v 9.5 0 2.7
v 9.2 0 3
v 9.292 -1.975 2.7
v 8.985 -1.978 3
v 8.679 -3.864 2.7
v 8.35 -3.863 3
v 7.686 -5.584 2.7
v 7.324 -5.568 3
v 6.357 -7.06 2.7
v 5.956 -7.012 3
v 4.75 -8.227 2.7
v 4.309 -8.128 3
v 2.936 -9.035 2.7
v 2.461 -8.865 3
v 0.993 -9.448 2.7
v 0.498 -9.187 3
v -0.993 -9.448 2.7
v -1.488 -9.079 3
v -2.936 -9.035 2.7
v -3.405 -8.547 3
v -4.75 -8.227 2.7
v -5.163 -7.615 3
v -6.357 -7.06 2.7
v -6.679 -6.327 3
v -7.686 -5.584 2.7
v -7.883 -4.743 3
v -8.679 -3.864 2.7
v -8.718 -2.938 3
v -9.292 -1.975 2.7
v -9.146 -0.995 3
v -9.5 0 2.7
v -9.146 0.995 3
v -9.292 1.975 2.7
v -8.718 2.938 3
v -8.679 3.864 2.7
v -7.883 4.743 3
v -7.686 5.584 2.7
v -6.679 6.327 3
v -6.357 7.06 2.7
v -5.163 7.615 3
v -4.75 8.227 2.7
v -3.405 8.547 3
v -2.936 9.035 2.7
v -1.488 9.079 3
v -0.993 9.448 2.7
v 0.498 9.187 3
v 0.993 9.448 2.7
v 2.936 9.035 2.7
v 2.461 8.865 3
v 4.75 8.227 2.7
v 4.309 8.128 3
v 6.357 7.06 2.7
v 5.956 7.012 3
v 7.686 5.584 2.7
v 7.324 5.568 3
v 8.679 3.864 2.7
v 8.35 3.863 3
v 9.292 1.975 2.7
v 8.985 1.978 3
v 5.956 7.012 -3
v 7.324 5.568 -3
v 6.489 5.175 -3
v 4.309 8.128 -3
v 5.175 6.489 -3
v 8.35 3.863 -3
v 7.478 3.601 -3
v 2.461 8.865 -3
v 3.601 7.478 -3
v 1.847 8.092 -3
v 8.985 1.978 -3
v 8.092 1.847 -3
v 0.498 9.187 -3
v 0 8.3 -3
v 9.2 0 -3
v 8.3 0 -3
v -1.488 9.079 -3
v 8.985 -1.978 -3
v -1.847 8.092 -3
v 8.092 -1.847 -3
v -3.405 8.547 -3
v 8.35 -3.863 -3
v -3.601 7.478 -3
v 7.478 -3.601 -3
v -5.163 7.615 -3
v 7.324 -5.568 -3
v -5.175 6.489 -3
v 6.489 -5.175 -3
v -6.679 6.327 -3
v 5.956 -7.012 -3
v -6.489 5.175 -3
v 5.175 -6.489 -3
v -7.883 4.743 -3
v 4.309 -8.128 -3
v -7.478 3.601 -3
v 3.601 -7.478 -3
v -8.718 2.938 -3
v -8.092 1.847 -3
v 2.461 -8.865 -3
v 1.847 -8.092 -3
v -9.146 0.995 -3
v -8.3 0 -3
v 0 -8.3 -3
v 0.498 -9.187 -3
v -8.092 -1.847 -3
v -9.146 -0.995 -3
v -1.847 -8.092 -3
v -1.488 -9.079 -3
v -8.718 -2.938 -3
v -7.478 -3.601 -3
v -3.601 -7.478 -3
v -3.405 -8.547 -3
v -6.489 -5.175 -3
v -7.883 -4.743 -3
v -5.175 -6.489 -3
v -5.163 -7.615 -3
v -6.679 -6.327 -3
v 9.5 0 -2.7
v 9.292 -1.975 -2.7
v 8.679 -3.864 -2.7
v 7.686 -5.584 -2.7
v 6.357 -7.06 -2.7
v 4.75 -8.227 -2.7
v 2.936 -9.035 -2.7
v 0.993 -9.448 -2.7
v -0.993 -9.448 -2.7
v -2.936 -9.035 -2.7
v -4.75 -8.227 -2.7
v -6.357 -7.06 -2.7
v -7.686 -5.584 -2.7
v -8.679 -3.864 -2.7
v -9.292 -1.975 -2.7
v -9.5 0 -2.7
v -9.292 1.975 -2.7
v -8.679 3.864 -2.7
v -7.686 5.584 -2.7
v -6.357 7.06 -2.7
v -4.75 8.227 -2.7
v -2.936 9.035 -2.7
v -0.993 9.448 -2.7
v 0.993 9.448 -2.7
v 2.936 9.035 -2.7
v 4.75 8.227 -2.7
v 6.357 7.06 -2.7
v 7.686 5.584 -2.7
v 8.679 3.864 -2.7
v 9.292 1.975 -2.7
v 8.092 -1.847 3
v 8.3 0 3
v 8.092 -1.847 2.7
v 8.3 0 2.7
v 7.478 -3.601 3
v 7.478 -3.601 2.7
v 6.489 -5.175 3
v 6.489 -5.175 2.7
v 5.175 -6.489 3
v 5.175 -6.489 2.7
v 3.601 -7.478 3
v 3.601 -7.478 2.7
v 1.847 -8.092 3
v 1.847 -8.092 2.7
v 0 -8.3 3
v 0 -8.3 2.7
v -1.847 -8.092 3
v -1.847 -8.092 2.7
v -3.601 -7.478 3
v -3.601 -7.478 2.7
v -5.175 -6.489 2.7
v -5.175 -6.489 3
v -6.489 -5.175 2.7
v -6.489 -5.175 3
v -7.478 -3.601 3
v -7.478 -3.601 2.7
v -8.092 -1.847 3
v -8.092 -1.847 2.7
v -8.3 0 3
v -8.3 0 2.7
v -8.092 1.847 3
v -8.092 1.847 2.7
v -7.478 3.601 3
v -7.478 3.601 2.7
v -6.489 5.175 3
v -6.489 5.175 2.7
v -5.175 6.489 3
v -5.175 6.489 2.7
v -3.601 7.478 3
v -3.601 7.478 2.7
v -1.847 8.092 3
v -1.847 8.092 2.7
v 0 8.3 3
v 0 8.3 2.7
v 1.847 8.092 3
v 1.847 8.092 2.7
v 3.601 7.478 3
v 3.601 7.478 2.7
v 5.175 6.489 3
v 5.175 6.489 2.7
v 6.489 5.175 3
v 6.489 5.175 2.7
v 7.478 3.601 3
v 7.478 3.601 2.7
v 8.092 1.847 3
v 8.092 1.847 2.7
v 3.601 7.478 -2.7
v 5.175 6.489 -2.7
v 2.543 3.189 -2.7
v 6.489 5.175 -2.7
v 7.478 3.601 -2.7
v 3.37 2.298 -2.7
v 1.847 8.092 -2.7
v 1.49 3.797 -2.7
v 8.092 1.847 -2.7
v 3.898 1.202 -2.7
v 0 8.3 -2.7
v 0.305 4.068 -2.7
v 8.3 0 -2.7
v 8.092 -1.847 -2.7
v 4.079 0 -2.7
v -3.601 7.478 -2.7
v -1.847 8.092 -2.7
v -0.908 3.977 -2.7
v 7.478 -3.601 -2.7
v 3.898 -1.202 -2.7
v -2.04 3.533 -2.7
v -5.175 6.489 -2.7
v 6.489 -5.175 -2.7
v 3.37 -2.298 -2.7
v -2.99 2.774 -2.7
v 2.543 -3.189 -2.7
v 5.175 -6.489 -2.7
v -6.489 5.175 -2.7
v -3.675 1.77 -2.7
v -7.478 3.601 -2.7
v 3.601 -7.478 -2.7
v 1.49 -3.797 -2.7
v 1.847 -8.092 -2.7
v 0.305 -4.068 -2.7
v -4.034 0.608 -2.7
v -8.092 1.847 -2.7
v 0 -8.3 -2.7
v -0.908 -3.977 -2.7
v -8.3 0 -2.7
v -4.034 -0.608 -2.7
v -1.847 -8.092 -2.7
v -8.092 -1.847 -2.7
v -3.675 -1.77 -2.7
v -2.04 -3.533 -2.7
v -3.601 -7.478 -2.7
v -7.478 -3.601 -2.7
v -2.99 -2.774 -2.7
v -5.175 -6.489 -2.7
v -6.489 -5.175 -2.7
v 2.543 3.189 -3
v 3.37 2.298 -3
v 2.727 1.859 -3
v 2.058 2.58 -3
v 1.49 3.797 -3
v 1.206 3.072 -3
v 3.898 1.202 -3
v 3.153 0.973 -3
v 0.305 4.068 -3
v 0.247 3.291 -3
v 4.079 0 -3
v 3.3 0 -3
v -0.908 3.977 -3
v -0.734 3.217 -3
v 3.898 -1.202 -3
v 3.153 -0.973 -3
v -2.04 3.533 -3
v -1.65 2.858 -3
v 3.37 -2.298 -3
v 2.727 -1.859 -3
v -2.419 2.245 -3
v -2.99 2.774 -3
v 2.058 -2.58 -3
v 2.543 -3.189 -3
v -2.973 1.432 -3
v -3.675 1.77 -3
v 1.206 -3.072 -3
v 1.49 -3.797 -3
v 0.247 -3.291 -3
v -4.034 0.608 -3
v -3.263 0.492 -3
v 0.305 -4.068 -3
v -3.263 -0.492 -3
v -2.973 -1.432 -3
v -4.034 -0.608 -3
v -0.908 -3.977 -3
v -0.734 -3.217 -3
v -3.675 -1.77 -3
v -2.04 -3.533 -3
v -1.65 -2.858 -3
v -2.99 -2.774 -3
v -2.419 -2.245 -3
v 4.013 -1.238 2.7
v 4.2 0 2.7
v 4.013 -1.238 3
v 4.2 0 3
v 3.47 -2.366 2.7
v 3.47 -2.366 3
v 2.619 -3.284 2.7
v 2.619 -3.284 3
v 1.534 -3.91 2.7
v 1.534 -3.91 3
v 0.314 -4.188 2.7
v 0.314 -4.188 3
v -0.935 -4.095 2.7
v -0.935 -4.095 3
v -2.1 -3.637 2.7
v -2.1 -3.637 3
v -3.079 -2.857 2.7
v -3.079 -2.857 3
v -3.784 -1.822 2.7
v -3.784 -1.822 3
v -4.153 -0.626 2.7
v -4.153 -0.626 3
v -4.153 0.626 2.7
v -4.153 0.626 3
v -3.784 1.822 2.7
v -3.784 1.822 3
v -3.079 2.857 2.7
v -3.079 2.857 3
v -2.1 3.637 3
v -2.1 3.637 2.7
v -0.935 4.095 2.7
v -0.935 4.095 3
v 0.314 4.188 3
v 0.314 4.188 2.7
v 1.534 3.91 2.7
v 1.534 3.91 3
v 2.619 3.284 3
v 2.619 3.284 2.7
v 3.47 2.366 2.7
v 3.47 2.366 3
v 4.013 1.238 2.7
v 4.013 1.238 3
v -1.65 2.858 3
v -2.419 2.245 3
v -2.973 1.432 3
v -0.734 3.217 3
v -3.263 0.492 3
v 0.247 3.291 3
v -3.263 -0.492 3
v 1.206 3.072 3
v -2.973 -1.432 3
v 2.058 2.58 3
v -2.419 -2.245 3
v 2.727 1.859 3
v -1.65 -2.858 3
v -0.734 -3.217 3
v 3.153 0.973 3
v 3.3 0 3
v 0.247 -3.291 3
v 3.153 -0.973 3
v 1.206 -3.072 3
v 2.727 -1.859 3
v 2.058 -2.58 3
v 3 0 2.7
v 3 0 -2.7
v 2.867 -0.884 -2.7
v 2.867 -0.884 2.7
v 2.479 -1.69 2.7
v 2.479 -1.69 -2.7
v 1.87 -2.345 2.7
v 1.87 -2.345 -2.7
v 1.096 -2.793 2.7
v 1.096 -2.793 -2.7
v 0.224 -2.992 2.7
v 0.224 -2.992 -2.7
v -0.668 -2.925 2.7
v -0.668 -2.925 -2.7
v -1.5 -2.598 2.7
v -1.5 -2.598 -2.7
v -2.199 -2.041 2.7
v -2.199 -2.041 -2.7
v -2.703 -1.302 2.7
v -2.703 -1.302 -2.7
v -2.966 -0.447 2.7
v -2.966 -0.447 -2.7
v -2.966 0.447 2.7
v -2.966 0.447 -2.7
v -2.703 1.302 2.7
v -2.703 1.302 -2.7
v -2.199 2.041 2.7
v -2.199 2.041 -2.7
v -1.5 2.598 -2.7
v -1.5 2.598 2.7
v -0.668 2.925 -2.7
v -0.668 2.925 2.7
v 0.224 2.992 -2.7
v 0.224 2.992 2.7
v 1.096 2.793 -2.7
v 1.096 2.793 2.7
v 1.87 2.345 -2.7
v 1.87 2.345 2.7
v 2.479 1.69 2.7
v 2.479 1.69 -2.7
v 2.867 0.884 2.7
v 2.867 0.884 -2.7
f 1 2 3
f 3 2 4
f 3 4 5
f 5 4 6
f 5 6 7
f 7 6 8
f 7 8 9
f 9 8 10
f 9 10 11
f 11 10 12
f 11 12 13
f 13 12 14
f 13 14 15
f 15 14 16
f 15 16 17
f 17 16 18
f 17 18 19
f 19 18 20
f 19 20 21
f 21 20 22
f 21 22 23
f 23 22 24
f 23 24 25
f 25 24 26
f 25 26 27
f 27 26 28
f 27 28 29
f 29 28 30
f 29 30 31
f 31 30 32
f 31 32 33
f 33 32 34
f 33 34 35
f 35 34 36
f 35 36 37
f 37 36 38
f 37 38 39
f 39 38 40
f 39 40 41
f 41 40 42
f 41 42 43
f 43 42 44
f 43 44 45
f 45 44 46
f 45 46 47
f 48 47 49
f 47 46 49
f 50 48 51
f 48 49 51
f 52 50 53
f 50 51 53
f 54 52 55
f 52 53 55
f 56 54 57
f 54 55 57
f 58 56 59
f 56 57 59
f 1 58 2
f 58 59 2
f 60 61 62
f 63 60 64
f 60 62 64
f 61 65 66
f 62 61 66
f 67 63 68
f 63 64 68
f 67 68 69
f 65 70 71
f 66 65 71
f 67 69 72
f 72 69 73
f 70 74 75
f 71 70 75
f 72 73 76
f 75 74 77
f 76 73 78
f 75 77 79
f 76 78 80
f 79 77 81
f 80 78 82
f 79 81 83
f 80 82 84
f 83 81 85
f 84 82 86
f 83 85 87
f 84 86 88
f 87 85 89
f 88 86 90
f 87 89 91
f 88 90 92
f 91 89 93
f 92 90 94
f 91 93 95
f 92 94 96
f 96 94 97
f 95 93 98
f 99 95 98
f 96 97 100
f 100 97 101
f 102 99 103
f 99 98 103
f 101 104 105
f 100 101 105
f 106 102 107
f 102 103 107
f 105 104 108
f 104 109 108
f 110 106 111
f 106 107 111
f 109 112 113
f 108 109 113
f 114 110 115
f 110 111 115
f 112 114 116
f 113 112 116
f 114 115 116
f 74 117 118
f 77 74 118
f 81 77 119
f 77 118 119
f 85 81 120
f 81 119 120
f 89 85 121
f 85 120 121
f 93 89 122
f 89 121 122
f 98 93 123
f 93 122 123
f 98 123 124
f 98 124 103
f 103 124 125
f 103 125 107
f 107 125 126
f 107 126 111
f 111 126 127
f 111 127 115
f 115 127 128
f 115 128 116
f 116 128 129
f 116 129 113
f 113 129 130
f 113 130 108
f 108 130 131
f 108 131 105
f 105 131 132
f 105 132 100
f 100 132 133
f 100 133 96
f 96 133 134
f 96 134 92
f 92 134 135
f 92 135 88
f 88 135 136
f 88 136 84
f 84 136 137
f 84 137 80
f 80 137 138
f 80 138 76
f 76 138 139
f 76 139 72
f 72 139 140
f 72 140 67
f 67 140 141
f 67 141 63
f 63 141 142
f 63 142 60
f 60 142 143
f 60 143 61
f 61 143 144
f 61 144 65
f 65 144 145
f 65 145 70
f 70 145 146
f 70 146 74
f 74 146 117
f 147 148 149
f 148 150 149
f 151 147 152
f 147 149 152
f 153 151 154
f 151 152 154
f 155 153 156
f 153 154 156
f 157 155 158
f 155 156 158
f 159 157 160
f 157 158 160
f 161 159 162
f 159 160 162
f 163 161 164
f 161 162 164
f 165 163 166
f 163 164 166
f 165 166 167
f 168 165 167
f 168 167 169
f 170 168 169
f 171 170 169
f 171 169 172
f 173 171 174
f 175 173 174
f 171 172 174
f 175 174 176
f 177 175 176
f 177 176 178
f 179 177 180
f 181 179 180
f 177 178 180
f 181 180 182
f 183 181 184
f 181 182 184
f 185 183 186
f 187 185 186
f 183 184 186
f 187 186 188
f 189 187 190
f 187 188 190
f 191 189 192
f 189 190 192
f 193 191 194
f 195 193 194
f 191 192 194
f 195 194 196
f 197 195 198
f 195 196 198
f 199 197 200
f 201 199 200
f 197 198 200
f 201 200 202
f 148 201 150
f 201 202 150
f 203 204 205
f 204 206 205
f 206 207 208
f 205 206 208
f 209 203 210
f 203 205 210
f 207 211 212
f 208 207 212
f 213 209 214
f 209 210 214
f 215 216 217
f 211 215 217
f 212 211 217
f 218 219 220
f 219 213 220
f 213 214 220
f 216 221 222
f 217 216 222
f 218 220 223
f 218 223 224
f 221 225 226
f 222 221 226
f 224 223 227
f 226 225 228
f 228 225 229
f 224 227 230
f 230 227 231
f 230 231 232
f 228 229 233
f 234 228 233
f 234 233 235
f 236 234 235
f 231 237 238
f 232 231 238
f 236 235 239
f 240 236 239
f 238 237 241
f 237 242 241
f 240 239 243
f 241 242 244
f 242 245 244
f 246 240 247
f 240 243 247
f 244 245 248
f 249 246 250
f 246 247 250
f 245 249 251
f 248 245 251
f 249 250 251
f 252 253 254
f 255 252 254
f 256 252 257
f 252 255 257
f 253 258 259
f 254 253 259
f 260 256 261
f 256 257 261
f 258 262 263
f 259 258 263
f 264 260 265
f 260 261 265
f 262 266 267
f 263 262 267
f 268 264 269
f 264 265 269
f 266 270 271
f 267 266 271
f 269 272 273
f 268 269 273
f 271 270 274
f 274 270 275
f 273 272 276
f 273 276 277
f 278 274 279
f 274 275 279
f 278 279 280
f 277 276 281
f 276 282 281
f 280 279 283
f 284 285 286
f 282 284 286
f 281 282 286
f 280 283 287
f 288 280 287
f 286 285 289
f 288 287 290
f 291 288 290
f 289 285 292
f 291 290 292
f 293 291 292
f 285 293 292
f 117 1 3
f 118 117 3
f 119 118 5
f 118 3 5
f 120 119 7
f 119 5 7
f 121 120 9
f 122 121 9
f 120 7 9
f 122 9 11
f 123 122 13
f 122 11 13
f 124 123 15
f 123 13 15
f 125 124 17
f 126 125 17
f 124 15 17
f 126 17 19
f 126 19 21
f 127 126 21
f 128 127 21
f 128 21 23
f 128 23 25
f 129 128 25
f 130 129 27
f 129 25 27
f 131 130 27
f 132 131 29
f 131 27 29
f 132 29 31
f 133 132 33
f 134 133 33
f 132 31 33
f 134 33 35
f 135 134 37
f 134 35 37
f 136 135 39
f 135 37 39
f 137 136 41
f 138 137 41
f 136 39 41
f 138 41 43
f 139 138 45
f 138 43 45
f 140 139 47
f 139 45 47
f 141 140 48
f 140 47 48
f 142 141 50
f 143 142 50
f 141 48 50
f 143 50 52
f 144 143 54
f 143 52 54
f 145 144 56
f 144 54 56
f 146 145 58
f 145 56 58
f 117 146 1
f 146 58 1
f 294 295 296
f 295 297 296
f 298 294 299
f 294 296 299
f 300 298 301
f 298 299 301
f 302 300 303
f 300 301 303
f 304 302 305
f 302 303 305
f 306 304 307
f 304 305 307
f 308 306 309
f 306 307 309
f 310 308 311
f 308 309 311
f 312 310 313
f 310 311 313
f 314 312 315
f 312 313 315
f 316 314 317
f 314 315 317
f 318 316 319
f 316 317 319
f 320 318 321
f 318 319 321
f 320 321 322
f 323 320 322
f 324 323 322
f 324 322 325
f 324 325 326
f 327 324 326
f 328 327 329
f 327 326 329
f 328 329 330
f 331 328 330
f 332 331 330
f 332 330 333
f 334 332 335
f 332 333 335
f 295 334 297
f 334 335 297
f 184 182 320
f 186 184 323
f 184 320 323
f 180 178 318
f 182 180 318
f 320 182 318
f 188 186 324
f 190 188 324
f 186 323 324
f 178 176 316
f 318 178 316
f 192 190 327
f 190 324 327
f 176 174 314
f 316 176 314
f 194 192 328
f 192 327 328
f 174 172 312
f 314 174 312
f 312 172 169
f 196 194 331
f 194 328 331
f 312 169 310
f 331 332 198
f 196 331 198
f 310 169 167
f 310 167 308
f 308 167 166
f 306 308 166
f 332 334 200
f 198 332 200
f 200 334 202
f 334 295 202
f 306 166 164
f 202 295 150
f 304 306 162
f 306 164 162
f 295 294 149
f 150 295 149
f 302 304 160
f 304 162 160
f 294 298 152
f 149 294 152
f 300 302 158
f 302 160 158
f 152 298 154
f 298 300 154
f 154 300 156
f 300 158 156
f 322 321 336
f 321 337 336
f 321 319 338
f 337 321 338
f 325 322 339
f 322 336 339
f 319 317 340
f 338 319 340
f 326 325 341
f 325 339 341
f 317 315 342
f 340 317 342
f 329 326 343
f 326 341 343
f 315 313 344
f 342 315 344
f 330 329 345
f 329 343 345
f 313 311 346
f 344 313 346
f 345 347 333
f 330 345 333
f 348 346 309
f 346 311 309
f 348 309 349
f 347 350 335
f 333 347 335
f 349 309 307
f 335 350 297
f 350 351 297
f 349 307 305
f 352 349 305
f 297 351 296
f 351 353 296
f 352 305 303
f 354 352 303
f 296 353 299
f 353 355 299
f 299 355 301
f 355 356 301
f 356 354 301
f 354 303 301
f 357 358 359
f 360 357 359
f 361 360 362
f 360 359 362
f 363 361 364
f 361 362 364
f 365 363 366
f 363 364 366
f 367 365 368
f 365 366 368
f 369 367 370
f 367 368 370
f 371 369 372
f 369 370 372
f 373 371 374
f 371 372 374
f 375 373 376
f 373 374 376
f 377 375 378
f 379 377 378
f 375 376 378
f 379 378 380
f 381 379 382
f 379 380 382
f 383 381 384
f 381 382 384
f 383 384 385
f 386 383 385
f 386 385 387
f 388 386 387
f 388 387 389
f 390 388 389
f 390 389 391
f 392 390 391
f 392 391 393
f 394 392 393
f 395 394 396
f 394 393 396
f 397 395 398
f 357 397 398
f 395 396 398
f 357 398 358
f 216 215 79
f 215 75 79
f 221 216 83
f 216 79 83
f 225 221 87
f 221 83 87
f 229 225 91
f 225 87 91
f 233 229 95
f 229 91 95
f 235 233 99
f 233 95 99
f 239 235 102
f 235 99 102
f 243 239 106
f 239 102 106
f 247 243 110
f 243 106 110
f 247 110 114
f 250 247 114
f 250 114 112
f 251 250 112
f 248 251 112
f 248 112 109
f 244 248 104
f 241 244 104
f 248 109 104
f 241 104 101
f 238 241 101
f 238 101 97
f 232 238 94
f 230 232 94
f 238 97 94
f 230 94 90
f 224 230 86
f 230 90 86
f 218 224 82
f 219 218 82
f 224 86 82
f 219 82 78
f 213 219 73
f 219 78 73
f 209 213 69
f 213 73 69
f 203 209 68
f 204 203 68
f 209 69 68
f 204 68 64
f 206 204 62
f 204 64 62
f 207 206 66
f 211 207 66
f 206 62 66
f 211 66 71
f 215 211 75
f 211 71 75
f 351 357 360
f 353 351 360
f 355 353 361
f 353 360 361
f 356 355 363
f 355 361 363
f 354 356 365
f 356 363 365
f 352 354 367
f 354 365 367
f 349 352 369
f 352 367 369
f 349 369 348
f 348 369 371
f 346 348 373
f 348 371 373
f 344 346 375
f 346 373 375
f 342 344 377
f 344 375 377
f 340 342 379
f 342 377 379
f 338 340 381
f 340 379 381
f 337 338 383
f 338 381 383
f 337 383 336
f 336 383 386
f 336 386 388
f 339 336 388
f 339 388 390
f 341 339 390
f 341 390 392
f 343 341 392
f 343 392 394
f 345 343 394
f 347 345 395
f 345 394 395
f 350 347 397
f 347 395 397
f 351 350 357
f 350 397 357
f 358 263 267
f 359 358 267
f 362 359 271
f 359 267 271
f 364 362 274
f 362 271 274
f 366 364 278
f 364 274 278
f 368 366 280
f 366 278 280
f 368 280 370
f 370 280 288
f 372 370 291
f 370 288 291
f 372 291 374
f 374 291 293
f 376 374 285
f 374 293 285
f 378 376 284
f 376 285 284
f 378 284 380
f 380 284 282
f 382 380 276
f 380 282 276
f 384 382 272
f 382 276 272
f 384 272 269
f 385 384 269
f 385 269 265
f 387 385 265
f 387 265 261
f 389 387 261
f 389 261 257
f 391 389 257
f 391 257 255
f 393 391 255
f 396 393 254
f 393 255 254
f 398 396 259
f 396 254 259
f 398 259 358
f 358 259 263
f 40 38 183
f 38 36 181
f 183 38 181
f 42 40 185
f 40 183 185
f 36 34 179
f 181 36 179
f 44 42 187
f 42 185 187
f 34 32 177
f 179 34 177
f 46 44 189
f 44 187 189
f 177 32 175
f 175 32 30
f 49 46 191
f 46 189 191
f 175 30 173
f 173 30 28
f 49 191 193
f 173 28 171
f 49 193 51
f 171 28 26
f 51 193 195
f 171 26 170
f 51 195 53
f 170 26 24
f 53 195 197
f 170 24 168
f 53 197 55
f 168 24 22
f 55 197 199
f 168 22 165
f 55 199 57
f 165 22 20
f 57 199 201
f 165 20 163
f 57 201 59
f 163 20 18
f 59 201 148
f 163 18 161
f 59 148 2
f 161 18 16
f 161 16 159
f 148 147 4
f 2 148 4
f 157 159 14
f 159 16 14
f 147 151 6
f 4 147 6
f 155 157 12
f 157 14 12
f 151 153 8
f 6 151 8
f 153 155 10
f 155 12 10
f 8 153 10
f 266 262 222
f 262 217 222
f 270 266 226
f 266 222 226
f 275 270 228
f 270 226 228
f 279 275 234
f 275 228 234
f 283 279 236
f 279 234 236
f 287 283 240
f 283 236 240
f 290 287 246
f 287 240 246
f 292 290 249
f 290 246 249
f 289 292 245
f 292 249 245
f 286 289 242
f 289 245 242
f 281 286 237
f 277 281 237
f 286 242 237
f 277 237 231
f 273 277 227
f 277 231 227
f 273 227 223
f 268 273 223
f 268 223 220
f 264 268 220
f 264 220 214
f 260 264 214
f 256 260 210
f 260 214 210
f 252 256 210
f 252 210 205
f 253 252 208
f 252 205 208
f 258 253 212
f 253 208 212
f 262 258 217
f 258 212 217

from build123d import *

# Parameters (mm, degrees)
F2_SIZE = 0.3


with BuildPart() as f1:
    # F0 (on Front) → F1 (revolve)
    with BuildSketch(Plane.XZ):
        Polygon((4.2, 3), (3, 3), (3, -3), (4.079062, -3), (4.079062, -2.7), (8.3, -2.7), (8.3, -3), (9.5, -3), (9.5, 3), (8.3, 3), (8.3, 2.7), (4.2, 2.7), align=None)
    revolve(axis=Axis((0, 0, 0), (0, 0, -1)))

    # F2
    f2_edges = [f1.edges().sort_by_distance(p)[0] for p in [
        (-9.5, 0, 3),
        (-9.5, 0, -3),
        (-3, 0, 3),
        (-3, 0, -3),
    ]]
    chamfer(f2_edges, length=F2_SIZE)


solid = f1.part
